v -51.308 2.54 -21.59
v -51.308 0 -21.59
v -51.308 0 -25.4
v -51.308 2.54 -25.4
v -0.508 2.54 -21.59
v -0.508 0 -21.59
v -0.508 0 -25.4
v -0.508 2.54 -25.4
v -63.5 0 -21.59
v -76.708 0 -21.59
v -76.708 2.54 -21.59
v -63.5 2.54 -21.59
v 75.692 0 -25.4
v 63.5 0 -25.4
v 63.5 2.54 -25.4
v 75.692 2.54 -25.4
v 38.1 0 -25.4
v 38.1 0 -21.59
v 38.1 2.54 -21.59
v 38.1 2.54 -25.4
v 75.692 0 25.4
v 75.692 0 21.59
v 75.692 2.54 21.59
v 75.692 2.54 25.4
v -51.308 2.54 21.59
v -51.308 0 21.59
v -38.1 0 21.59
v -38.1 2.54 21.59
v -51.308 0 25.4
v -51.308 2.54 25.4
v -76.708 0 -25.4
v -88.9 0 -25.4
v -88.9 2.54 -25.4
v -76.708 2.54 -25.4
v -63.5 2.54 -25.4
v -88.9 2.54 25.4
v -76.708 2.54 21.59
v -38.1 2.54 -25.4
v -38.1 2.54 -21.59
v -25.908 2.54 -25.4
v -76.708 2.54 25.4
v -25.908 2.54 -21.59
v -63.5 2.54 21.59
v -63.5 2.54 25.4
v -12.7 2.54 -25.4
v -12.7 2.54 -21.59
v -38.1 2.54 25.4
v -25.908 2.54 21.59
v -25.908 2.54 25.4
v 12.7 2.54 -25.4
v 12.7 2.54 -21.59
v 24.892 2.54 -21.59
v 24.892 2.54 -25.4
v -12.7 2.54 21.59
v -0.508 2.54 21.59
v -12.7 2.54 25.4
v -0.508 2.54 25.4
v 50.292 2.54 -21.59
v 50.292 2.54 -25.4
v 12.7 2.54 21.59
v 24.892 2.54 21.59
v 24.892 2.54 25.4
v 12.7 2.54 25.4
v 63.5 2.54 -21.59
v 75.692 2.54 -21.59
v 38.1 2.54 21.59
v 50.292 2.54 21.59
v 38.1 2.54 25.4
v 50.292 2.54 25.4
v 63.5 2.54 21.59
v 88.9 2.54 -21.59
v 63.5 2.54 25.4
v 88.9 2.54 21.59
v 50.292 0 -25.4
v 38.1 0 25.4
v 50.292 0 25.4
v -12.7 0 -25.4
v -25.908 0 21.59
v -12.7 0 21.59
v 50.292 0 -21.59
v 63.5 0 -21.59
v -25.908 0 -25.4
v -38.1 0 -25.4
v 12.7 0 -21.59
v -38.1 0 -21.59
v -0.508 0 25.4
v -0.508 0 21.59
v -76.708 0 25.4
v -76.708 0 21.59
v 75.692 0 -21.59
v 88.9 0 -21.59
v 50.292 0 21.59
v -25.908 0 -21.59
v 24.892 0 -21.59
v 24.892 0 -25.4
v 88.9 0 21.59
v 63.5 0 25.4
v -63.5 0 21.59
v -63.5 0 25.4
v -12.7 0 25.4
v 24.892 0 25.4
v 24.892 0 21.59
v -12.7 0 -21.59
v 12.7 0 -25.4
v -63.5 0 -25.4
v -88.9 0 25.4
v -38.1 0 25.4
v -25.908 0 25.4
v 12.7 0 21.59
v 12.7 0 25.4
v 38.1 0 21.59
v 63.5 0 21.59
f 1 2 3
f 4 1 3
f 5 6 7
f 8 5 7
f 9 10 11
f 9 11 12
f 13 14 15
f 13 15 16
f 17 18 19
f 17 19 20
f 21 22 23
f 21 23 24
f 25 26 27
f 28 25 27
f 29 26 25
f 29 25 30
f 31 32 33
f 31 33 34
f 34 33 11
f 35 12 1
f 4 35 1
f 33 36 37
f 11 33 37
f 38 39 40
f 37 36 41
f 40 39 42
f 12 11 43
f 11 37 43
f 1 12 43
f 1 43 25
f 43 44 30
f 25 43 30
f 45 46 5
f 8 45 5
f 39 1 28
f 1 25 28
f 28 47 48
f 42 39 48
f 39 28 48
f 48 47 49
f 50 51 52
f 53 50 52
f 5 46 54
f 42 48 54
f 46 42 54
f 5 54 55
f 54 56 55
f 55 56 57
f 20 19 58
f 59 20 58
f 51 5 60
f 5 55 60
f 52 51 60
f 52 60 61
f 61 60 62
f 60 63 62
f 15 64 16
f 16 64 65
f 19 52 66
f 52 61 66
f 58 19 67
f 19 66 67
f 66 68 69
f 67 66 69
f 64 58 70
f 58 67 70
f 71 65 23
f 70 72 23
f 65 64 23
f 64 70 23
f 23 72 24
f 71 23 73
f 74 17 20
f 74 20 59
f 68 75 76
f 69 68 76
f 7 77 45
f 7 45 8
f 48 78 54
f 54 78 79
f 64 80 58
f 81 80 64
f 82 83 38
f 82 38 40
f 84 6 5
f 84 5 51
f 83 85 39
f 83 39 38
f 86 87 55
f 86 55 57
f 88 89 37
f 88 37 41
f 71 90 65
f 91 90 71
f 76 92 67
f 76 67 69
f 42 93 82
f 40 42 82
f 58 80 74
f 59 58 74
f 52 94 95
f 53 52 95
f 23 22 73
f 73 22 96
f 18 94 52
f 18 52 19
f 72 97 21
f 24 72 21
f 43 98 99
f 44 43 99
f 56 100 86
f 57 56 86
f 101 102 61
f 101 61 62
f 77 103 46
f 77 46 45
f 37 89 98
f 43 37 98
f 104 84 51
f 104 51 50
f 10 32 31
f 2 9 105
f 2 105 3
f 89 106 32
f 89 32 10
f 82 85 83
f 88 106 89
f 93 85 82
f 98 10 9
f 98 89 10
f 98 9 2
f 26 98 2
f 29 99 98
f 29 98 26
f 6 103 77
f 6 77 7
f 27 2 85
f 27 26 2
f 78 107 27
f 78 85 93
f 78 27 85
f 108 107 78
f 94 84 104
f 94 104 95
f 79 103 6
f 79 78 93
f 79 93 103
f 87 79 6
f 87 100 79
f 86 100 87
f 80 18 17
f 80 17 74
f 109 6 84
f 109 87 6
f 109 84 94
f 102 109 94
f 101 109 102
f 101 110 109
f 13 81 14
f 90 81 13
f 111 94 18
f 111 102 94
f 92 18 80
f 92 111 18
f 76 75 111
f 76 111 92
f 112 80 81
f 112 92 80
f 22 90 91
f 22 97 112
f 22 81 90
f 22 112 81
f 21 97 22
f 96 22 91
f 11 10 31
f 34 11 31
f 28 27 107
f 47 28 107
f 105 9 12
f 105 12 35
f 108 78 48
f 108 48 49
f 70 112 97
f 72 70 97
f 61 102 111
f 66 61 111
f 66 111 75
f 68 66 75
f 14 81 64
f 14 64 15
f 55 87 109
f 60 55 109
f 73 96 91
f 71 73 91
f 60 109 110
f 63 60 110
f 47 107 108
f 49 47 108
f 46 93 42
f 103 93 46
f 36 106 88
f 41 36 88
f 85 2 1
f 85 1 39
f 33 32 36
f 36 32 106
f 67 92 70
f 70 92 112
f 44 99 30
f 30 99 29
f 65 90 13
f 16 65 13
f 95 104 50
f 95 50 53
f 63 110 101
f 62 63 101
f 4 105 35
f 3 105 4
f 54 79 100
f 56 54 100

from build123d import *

# Parameters (mm, degrees)
SKETCH1_W           = 177.8
SKETCH1_H           = 43.18
BOSS_EXTRUDE1_DEPTH = 2.54
SKETCH2_W           = 12.192
SKETCH2_H           = 3.81
BOSS_EXTRUDE2_DEPTH = 2.54


with BuildPart() as part:
    # Sketch1 → Boss-Extrude1 (new body)
    with BuildSketch(Plane(origin=(0, 0, 0), x_dir=(1, 0, 0), z_dir=(0, 1, 0))):
        Rectangle(SKETCH1_W, SKETCH1_H)
    extrude(amount=BOSS_EXTRUDE1_DEPTH)

    # Sketch2 → Boss-Extrude2 (add)
    with BuildSketch(Plane(origin=(0, 0, 0), x_dir=(1, 0, 0), z_dir=(0, 1, 0))):
        with Locations((-57.404, 23.495)):
            Rectangle(SKETCH2_W, SKETCH2_H)
        with Locations((-82.804, 23.495)):
            Rectangle(SKETCH2_W, SKETCH2_H)
        with Locations((-32.004, 23.495)):
            Rectangle(SKETCH2_W, SKETCH2_H)
        with Locations((-6.604, 23.495)):
            Rectangle(SKETCH2_W, SKETCH2_H)
        with Locations((18.796, 23.495)):
            Rectangle(SKETCH2_W, SKETCH2_H)
        with Locations((44.196, 23.495)):
            Rectangle(SKETCH2_W, SKETCH2_H)
        with Locations((69.596, 23.495)):
            Rectangle(SKETCH2_W, SKETCH2_H)
    boss_extrude2 = extrude(amount=BOSS_EXTRUDE2_DEPTH)

    # Mirror1: Boss-Extrude2 across plane
    add(boss_extrude2.mirror(Plane.XY))


solid = part.part
